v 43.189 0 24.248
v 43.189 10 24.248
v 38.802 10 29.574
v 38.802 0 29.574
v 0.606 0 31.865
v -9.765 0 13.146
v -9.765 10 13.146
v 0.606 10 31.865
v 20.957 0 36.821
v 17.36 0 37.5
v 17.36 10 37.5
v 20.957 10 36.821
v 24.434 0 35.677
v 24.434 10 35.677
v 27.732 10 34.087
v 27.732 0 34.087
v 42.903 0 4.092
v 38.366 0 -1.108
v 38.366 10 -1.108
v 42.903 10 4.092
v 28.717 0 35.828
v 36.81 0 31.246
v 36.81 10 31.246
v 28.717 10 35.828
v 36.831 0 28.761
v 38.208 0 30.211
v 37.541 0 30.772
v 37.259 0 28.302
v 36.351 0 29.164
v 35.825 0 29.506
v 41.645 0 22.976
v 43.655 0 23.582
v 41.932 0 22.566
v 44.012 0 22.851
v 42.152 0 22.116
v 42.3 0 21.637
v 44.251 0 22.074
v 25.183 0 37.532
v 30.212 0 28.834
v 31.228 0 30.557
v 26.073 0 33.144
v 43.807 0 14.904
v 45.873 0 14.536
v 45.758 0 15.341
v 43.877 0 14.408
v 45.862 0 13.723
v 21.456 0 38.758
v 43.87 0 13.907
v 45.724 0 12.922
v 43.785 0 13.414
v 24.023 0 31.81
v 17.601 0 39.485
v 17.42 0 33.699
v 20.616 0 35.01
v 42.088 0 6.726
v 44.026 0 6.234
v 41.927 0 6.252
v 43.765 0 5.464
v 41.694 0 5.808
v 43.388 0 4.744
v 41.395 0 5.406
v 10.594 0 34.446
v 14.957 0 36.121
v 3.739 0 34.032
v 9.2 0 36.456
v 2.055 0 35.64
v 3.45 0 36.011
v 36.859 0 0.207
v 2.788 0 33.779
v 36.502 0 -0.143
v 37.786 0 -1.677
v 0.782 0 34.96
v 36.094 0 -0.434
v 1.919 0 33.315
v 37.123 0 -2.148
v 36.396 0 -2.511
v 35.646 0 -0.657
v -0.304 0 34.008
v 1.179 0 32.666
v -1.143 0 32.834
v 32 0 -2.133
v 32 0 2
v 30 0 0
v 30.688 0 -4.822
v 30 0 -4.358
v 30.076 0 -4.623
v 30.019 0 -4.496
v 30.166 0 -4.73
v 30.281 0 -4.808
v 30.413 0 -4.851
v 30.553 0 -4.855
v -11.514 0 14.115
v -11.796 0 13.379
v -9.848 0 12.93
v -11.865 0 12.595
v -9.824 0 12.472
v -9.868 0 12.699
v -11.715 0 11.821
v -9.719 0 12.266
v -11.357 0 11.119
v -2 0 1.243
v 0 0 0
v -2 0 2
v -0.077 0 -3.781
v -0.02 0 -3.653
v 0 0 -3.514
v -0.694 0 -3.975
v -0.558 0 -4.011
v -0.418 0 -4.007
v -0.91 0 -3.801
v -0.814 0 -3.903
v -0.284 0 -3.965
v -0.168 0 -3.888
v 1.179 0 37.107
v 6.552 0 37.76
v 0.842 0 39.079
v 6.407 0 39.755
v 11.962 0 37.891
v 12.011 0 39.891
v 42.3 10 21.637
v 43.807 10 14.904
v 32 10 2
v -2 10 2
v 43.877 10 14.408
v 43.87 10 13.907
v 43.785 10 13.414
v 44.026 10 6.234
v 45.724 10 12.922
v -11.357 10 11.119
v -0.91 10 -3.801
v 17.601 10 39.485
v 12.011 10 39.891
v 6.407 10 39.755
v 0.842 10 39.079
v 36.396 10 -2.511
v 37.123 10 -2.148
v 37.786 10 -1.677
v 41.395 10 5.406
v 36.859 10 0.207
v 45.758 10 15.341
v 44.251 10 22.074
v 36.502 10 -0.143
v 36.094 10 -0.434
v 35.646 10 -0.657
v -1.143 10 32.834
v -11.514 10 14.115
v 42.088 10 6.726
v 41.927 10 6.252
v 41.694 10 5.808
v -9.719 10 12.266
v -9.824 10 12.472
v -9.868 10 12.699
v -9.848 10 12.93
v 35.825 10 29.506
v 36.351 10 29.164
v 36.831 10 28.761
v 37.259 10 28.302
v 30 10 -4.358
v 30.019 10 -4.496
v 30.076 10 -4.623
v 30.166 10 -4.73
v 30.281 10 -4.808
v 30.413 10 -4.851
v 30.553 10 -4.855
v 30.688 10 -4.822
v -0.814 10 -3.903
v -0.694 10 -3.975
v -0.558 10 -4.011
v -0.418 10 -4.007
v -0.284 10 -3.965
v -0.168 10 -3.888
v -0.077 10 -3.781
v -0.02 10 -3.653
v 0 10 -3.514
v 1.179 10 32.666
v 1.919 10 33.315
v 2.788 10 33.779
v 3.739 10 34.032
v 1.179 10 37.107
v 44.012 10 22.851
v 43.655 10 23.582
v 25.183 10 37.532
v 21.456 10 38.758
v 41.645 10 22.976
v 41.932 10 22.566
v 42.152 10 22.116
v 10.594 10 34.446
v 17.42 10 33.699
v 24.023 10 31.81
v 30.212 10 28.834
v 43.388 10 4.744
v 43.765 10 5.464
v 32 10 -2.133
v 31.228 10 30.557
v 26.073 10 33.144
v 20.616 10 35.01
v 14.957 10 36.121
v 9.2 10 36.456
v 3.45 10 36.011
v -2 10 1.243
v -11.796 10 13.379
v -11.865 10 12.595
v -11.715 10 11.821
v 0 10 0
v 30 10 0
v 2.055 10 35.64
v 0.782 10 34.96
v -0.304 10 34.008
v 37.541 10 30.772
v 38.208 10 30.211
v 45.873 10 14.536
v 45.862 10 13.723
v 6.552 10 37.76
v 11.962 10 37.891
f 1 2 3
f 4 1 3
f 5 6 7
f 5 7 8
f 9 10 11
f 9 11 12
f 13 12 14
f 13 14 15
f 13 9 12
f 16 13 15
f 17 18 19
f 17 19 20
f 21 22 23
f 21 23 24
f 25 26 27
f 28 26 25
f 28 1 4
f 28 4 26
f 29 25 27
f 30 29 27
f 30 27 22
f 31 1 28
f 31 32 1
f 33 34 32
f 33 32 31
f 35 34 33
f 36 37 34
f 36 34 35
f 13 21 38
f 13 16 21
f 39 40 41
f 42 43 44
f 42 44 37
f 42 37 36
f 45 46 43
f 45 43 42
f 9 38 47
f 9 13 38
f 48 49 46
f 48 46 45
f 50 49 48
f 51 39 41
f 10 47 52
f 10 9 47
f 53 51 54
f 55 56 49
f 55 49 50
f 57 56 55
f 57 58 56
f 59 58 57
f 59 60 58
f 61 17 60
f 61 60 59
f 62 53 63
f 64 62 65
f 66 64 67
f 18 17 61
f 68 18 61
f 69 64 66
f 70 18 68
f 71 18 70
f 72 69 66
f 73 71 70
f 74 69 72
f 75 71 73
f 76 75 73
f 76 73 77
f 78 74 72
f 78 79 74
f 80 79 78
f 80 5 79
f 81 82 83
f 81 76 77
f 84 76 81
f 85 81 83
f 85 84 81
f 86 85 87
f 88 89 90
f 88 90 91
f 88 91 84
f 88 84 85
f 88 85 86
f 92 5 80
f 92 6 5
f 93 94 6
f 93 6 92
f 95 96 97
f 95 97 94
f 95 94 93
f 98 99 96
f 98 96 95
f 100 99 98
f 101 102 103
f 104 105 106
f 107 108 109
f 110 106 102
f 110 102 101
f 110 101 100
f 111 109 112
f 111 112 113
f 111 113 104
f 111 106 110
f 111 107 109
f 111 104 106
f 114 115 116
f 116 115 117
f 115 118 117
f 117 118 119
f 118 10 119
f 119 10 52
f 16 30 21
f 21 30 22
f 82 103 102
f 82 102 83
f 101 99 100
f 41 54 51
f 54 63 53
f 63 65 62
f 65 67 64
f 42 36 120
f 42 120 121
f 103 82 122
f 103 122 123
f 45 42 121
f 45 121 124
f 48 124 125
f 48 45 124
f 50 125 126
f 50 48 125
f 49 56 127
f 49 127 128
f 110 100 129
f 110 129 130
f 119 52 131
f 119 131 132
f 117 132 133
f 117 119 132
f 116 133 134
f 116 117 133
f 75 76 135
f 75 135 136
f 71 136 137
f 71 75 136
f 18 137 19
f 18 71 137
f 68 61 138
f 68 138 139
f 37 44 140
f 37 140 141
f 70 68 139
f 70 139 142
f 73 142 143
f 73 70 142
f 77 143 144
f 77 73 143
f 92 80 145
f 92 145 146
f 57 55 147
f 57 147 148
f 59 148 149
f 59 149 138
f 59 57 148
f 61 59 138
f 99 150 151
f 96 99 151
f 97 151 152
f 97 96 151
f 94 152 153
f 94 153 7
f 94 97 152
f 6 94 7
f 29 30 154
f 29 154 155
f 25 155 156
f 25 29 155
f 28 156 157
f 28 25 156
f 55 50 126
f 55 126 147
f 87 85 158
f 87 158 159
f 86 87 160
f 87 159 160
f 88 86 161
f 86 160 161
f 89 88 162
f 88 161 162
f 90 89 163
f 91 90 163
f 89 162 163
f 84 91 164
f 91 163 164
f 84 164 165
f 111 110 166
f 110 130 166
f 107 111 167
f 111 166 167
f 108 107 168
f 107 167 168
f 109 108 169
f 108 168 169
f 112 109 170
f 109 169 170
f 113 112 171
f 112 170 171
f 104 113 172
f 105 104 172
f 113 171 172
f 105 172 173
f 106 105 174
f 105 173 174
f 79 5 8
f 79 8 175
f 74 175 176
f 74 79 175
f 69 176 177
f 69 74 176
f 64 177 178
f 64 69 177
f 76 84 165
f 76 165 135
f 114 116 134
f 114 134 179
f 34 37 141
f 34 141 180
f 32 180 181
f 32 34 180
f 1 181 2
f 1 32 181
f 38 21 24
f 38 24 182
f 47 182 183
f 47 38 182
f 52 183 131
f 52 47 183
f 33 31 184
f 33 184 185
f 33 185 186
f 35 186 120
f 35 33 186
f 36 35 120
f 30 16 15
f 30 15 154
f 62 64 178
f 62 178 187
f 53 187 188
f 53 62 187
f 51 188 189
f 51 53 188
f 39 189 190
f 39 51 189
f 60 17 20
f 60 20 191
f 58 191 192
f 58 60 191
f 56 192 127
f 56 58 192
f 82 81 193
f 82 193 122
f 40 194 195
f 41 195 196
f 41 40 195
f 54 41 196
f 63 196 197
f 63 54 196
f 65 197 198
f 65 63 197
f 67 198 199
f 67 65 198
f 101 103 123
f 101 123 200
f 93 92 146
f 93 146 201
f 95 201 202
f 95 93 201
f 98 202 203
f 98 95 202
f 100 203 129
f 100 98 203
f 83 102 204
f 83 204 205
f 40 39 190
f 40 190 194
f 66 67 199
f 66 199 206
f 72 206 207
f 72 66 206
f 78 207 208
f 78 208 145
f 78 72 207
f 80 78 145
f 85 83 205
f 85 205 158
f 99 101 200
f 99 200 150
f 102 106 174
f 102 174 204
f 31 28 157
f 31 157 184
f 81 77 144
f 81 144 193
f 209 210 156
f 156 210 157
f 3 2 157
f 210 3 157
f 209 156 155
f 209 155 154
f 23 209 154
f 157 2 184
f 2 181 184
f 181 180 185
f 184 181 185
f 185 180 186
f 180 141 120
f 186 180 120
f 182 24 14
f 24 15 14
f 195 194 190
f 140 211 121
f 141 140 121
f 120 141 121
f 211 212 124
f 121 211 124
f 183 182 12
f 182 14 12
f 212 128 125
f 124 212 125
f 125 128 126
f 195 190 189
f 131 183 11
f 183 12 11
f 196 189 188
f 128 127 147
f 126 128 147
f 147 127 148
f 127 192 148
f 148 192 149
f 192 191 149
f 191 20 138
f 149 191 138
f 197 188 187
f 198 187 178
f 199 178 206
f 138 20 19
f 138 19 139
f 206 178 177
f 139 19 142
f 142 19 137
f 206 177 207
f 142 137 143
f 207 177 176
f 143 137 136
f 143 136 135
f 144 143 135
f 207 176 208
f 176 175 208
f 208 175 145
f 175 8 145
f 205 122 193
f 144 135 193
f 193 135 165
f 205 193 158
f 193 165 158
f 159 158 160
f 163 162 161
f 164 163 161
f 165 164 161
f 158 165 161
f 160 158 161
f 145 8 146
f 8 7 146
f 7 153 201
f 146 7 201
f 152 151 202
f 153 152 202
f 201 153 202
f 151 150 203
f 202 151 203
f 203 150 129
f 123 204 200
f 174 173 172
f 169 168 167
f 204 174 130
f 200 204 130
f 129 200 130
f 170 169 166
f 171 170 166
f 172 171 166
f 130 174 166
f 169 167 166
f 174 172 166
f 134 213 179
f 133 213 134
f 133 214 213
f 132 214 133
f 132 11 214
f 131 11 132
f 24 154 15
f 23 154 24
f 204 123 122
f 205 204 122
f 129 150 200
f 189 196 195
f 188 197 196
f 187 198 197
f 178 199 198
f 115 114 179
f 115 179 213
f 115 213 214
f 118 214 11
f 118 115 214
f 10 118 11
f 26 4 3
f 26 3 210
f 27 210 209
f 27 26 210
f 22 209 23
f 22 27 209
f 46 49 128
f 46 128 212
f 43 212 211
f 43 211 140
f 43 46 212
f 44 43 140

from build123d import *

# Parameters (mm, degrees)
EXTRUDE_THIN1_DEPTH = 10
FILLET1_R           = 0.5


with BuildPart() as part:
    # Sketch1 → Extrude-Thin1 (new body)
    with BuildSketch(Plane(origin=(0, 0, 0), x_dir=(1, 0, 0), z_dir=(0, 1, 0))):
        with BuildLine():
            ThreePointArc((31.228009552, -30.556896247), (17.805759331, -35.661082732), (3.450021006, -36.010793734))
            ThreePointArc((3.450021006, -36.010793734), (0.781528732, -34.960126351), (-1.143442514, -32.834276246))
            Line((-1.143442514, -32.834276246), (-11.514158233, -14.115081405))
            ThreePointArc((-11.514158233, -14.115081405), (-11.864920764, -12.594591782), (-11.35681344, -11.119210477))
            Line((-11.35681344, -11.119210477), (0, 5.1))
            Line((0, 5.1), (0, 0))
            Line((0, 0), (30, 0))
            Line((30, 0), (30, 5.1))
            Line((30, 5.1), (36.395958363, 2.511232605))
            ThreePointArc((36.395958363, 2.511232605), (37.463728778, 1.925417586), (38.366240646, 1.107624688))
            Line((38.366240646, 1.107624688), (42.902523658, -4.091619145))
            ThreePointArc((42.902523658, -4.091619145), (43.590417547, -5.096663868), (44.026071732, -6.233993339))
            Line((44.026071732, -6.233993339), (45.723869414, -12.921854211))
            ThreePointArc((45.723869414, -12.921854211), (45.883457457, -14.129266548), (45.7582513, -15.340726954))
            Line((45.7582513, -15.340726954), (44.251223786, -22.074141249))
            ThreePointArc((44.251223786, -22.074141249), (43.848071102, -23.223393532), (43.189020782, -24.247583736))
            Line((43.189020782, -24.247583736), (38.802344779, -29.573658617))
            ThreePointArc((38.802344779, -29.573658617), (37.883123065, -30.501625481), (36.810104599, -31.246422387))
            Line((36.810104599, -31.246422387), (28.716751538, -35.827648886))
            ThreePointArc((28.716751538, -35.827648886), (23.339920043, -38.206219709), (17.601311476, -39.485394366))
            ThreePointArc((17.601311476, -39.485394366), (9.20703571, -39.890619172), (0.842295428, -39.078712278))
            Line((0.842295428, -39.078712278), (1.179197641, -37.107292257))
            ThreePointArc((1.179197641, -37.107292257), (9.255554358, -37.891207773), (17.360428291, -37.499953535))
            ThreePointArc((17.360428291, -37.499953535), (22.714760553, -36.306436666), (27.731541539, -34.087142851))
            Line((27.731541539, -34.087142851), (35.824894599, -29.505916352))
            ThreePointArc((35.824894599, -29.505916352), (36.597062561, -28.969943927), (37.258554958, -28.302158326))
            Line((37.258554958, -28.302158326), (41.645230962, -22.976083445))
            ThreePointArc((41.645230962, -22.976083445), (42.051182062, -22.345219415), (42.299509498, -21.63732168))
            Line((42.299509498, -21.63732168), (43.806537012, -14.903907385))
            ThreePointArc((43.806537012, -14.903907385), (43.883659464, -14.157691701), (43.785359016, -13.413969481))
            Line((43.785359016, -13.413969481), (42.087561335, -6.72610861))
            ThreePointArc((42.087561335, -6.72610861), (41.819214153, -6.025554893), (41.39549646, -5.406483786))
            Line((41.39549646, -5.406483786), (36.859213448, -0.207239953))
            ThreePointArc((36.859213448, -0.207239953), (36.303298861, 0.29649082), (35.645591002, 0.657331631))
            Line((35.645591002, 0.657331631), (32, 2.13288644))
            Line((32, 2.13288644), (32, -2))
            Line((32, -2), (-2, -2))
            Line((-2, -2), (-2, -1.243189605))
            Line((-2, -1.243189605), (-9.718509351, -12.26636335))
            ThreePointArc((-9.718509351, -12.26636335), (-9.867673478, -12.69948831), (-9.764700771, -13.145855637))
            Line((-9.764700771, -13.145855637), (0.606014947, -31.865050477))
            ThreePointArc((0.606014947, -31.865050477), (1.919083649, -33.31514343), (3.73932574, -34.031828659))
            ThreePointArc((3.73932574, -34.031828659), (17.420438321, -33.698551784), (30.211930629, -28.834228658))
            Line((30.211930629, -28.834228658), (31.228009552, -30.556896247))
        make_face()
    extrude(amount=EXTRUDE_THIN1_DEPTH)

    # Fillet1
    fillet1_edges = [part.edges().sort_by_distance(p)[0] for p in [
        (0, 5, -5.1),
        (30, 5, -5.1),
    ]]
    fillet(fillet1_edges, radius=FILLET1_R)


solid = part.part
